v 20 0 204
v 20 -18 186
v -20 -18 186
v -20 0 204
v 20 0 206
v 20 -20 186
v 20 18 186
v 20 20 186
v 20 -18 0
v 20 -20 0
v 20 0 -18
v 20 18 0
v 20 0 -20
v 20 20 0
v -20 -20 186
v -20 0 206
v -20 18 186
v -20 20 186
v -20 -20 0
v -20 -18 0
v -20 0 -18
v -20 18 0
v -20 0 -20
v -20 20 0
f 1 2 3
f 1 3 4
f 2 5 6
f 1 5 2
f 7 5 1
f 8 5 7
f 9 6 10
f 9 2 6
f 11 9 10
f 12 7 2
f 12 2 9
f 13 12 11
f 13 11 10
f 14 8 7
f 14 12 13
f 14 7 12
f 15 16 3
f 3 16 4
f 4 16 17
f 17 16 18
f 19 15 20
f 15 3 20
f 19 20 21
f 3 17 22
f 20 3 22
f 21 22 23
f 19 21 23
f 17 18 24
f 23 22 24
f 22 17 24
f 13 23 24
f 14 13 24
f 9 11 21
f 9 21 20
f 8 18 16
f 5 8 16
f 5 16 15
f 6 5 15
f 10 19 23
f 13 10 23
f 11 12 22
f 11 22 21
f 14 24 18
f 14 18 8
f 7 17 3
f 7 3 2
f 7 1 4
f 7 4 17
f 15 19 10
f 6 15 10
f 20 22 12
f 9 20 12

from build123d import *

# Parameters (mm, degrees)
CROQUIS1_W              = 40
CROQUIS1_H              = 40
SALIENTE_EXTRUIR1_DEPTH = 186
SALIENTE_EXTRUIR2_DEPTH = 40


with BuildPart() as part:
    # Croquis1 → Saliente-Extruir1 (new body)
    with BuildSketch(Plane.XY):
        Rectangle(CROQUIS1_W, CROQUIS1_H)
    extrude(amount=SALIENTE_EXTRUIR1_DEPTH)

    # Croquis4 → Saliente-Extruir2 (add)
    with BuildSketch(Plane(origin=(20, 0, 0), x_dir=(0, 0, -1), z_dir=(1, 0, 0))):
        Polygon((0, -20), (20, 0), (18, 0), (0, -18), align=None)
        Polygon((20, 0), (0, 20), (0, 18), (18, 0), align=None)
        Polygon((-186, 18), (-186, 20), (-206, 0), (-204, 0), align=None)
        Polygon((-204, 0), (-206, 0), (-186, -20), (-186, -18), align=None)
    extrude(amount=-SALIENTE_EXTRUIR2_DEPTH)


solid = part.part
